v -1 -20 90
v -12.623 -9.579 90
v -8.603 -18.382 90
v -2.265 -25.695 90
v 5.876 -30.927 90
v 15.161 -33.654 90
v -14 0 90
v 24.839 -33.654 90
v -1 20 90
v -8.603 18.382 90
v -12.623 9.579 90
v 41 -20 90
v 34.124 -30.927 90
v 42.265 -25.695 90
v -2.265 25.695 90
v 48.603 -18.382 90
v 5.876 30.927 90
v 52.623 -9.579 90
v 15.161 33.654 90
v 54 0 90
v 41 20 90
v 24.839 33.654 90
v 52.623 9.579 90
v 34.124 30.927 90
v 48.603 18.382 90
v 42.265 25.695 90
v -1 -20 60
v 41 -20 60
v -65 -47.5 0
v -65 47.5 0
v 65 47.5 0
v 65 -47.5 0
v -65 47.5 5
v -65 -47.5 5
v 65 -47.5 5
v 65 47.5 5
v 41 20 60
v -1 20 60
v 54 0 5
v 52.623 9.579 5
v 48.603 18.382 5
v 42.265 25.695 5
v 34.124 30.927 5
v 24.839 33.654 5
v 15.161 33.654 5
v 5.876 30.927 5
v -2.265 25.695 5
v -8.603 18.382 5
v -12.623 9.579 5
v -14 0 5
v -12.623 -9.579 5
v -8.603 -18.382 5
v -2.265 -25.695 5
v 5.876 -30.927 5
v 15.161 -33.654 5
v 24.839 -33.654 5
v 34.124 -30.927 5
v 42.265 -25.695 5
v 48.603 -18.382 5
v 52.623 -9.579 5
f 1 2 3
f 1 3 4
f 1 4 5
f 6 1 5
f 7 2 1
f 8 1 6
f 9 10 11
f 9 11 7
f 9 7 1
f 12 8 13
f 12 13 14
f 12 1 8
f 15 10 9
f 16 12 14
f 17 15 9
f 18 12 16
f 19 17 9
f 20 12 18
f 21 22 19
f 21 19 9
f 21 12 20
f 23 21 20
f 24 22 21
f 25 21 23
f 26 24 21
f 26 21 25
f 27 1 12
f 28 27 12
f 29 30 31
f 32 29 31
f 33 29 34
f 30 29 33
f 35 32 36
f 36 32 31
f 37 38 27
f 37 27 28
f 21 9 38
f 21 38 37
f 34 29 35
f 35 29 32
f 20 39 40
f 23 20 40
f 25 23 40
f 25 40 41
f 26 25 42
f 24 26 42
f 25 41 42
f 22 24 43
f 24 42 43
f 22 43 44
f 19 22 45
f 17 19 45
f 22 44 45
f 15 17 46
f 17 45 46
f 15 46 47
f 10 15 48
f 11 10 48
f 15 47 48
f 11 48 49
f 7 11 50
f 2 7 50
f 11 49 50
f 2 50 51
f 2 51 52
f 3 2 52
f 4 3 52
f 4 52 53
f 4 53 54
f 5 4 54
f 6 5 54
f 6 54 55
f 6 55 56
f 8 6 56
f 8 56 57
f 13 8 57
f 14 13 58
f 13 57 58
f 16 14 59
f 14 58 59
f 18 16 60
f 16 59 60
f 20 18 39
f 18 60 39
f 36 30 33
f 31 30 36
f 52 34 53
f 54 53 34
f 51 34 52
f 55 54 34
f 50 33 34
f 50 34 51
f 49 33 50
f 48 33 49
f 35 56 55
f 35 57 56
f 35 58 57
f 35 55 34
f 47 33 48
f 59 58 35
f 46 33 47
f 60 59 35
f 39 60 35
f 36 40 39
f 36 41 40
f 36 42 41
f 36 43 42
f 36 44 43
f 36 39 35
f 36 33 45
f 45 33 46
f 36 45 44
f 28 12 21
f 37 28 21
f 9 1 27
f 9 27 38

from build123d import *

# Parameters (mm, degrees)
CROQUIS1_W              = 130
CROQUIS1_H              = 95
SALIENTE_EXTRUIR1_DEPTH = 5
CROQUIS2_R              = 34
SALIENTE_EXTRUIR2_DEPTH = 85
CROQUIS3_W              = 42
CROQUIS3_H              = 40
CORTAR_EXTRUIR1_DEPTH   = 30


with BuildPart() as part:
    # Croquis1 → Saliente-Extruir1 (new body)
    with BuildSketch(Plane.XY):
        Rectangle(CROQUIS1_W, CROQUIS1_H)
    extrude(amount=SALIENTE_EXTRUIR1_DEPTH)

    # Croquis2 → Saliente-Extruir2 (add)
    with BuildSketch(Plane.XY.offset(5)):
        with Locations((20, 0)):
            Circle(CROQUIS2_R)
    extrude(amount=SALIENTE_EXTRUIR2_DEPTH)

    # Croquis3 → Cortar-Extruir1 (cut)
    with BuildSketch(Plane.XY.offset(90)):
        with Locations((20, 0)):
            Rectangle(CROQUIS3_W, CROQUIS3_H)
    extrude(amount=-CORTAR_EXTRUIR1_DEPTH, mode=Mode.SUBTRACT)


solid = part.part
